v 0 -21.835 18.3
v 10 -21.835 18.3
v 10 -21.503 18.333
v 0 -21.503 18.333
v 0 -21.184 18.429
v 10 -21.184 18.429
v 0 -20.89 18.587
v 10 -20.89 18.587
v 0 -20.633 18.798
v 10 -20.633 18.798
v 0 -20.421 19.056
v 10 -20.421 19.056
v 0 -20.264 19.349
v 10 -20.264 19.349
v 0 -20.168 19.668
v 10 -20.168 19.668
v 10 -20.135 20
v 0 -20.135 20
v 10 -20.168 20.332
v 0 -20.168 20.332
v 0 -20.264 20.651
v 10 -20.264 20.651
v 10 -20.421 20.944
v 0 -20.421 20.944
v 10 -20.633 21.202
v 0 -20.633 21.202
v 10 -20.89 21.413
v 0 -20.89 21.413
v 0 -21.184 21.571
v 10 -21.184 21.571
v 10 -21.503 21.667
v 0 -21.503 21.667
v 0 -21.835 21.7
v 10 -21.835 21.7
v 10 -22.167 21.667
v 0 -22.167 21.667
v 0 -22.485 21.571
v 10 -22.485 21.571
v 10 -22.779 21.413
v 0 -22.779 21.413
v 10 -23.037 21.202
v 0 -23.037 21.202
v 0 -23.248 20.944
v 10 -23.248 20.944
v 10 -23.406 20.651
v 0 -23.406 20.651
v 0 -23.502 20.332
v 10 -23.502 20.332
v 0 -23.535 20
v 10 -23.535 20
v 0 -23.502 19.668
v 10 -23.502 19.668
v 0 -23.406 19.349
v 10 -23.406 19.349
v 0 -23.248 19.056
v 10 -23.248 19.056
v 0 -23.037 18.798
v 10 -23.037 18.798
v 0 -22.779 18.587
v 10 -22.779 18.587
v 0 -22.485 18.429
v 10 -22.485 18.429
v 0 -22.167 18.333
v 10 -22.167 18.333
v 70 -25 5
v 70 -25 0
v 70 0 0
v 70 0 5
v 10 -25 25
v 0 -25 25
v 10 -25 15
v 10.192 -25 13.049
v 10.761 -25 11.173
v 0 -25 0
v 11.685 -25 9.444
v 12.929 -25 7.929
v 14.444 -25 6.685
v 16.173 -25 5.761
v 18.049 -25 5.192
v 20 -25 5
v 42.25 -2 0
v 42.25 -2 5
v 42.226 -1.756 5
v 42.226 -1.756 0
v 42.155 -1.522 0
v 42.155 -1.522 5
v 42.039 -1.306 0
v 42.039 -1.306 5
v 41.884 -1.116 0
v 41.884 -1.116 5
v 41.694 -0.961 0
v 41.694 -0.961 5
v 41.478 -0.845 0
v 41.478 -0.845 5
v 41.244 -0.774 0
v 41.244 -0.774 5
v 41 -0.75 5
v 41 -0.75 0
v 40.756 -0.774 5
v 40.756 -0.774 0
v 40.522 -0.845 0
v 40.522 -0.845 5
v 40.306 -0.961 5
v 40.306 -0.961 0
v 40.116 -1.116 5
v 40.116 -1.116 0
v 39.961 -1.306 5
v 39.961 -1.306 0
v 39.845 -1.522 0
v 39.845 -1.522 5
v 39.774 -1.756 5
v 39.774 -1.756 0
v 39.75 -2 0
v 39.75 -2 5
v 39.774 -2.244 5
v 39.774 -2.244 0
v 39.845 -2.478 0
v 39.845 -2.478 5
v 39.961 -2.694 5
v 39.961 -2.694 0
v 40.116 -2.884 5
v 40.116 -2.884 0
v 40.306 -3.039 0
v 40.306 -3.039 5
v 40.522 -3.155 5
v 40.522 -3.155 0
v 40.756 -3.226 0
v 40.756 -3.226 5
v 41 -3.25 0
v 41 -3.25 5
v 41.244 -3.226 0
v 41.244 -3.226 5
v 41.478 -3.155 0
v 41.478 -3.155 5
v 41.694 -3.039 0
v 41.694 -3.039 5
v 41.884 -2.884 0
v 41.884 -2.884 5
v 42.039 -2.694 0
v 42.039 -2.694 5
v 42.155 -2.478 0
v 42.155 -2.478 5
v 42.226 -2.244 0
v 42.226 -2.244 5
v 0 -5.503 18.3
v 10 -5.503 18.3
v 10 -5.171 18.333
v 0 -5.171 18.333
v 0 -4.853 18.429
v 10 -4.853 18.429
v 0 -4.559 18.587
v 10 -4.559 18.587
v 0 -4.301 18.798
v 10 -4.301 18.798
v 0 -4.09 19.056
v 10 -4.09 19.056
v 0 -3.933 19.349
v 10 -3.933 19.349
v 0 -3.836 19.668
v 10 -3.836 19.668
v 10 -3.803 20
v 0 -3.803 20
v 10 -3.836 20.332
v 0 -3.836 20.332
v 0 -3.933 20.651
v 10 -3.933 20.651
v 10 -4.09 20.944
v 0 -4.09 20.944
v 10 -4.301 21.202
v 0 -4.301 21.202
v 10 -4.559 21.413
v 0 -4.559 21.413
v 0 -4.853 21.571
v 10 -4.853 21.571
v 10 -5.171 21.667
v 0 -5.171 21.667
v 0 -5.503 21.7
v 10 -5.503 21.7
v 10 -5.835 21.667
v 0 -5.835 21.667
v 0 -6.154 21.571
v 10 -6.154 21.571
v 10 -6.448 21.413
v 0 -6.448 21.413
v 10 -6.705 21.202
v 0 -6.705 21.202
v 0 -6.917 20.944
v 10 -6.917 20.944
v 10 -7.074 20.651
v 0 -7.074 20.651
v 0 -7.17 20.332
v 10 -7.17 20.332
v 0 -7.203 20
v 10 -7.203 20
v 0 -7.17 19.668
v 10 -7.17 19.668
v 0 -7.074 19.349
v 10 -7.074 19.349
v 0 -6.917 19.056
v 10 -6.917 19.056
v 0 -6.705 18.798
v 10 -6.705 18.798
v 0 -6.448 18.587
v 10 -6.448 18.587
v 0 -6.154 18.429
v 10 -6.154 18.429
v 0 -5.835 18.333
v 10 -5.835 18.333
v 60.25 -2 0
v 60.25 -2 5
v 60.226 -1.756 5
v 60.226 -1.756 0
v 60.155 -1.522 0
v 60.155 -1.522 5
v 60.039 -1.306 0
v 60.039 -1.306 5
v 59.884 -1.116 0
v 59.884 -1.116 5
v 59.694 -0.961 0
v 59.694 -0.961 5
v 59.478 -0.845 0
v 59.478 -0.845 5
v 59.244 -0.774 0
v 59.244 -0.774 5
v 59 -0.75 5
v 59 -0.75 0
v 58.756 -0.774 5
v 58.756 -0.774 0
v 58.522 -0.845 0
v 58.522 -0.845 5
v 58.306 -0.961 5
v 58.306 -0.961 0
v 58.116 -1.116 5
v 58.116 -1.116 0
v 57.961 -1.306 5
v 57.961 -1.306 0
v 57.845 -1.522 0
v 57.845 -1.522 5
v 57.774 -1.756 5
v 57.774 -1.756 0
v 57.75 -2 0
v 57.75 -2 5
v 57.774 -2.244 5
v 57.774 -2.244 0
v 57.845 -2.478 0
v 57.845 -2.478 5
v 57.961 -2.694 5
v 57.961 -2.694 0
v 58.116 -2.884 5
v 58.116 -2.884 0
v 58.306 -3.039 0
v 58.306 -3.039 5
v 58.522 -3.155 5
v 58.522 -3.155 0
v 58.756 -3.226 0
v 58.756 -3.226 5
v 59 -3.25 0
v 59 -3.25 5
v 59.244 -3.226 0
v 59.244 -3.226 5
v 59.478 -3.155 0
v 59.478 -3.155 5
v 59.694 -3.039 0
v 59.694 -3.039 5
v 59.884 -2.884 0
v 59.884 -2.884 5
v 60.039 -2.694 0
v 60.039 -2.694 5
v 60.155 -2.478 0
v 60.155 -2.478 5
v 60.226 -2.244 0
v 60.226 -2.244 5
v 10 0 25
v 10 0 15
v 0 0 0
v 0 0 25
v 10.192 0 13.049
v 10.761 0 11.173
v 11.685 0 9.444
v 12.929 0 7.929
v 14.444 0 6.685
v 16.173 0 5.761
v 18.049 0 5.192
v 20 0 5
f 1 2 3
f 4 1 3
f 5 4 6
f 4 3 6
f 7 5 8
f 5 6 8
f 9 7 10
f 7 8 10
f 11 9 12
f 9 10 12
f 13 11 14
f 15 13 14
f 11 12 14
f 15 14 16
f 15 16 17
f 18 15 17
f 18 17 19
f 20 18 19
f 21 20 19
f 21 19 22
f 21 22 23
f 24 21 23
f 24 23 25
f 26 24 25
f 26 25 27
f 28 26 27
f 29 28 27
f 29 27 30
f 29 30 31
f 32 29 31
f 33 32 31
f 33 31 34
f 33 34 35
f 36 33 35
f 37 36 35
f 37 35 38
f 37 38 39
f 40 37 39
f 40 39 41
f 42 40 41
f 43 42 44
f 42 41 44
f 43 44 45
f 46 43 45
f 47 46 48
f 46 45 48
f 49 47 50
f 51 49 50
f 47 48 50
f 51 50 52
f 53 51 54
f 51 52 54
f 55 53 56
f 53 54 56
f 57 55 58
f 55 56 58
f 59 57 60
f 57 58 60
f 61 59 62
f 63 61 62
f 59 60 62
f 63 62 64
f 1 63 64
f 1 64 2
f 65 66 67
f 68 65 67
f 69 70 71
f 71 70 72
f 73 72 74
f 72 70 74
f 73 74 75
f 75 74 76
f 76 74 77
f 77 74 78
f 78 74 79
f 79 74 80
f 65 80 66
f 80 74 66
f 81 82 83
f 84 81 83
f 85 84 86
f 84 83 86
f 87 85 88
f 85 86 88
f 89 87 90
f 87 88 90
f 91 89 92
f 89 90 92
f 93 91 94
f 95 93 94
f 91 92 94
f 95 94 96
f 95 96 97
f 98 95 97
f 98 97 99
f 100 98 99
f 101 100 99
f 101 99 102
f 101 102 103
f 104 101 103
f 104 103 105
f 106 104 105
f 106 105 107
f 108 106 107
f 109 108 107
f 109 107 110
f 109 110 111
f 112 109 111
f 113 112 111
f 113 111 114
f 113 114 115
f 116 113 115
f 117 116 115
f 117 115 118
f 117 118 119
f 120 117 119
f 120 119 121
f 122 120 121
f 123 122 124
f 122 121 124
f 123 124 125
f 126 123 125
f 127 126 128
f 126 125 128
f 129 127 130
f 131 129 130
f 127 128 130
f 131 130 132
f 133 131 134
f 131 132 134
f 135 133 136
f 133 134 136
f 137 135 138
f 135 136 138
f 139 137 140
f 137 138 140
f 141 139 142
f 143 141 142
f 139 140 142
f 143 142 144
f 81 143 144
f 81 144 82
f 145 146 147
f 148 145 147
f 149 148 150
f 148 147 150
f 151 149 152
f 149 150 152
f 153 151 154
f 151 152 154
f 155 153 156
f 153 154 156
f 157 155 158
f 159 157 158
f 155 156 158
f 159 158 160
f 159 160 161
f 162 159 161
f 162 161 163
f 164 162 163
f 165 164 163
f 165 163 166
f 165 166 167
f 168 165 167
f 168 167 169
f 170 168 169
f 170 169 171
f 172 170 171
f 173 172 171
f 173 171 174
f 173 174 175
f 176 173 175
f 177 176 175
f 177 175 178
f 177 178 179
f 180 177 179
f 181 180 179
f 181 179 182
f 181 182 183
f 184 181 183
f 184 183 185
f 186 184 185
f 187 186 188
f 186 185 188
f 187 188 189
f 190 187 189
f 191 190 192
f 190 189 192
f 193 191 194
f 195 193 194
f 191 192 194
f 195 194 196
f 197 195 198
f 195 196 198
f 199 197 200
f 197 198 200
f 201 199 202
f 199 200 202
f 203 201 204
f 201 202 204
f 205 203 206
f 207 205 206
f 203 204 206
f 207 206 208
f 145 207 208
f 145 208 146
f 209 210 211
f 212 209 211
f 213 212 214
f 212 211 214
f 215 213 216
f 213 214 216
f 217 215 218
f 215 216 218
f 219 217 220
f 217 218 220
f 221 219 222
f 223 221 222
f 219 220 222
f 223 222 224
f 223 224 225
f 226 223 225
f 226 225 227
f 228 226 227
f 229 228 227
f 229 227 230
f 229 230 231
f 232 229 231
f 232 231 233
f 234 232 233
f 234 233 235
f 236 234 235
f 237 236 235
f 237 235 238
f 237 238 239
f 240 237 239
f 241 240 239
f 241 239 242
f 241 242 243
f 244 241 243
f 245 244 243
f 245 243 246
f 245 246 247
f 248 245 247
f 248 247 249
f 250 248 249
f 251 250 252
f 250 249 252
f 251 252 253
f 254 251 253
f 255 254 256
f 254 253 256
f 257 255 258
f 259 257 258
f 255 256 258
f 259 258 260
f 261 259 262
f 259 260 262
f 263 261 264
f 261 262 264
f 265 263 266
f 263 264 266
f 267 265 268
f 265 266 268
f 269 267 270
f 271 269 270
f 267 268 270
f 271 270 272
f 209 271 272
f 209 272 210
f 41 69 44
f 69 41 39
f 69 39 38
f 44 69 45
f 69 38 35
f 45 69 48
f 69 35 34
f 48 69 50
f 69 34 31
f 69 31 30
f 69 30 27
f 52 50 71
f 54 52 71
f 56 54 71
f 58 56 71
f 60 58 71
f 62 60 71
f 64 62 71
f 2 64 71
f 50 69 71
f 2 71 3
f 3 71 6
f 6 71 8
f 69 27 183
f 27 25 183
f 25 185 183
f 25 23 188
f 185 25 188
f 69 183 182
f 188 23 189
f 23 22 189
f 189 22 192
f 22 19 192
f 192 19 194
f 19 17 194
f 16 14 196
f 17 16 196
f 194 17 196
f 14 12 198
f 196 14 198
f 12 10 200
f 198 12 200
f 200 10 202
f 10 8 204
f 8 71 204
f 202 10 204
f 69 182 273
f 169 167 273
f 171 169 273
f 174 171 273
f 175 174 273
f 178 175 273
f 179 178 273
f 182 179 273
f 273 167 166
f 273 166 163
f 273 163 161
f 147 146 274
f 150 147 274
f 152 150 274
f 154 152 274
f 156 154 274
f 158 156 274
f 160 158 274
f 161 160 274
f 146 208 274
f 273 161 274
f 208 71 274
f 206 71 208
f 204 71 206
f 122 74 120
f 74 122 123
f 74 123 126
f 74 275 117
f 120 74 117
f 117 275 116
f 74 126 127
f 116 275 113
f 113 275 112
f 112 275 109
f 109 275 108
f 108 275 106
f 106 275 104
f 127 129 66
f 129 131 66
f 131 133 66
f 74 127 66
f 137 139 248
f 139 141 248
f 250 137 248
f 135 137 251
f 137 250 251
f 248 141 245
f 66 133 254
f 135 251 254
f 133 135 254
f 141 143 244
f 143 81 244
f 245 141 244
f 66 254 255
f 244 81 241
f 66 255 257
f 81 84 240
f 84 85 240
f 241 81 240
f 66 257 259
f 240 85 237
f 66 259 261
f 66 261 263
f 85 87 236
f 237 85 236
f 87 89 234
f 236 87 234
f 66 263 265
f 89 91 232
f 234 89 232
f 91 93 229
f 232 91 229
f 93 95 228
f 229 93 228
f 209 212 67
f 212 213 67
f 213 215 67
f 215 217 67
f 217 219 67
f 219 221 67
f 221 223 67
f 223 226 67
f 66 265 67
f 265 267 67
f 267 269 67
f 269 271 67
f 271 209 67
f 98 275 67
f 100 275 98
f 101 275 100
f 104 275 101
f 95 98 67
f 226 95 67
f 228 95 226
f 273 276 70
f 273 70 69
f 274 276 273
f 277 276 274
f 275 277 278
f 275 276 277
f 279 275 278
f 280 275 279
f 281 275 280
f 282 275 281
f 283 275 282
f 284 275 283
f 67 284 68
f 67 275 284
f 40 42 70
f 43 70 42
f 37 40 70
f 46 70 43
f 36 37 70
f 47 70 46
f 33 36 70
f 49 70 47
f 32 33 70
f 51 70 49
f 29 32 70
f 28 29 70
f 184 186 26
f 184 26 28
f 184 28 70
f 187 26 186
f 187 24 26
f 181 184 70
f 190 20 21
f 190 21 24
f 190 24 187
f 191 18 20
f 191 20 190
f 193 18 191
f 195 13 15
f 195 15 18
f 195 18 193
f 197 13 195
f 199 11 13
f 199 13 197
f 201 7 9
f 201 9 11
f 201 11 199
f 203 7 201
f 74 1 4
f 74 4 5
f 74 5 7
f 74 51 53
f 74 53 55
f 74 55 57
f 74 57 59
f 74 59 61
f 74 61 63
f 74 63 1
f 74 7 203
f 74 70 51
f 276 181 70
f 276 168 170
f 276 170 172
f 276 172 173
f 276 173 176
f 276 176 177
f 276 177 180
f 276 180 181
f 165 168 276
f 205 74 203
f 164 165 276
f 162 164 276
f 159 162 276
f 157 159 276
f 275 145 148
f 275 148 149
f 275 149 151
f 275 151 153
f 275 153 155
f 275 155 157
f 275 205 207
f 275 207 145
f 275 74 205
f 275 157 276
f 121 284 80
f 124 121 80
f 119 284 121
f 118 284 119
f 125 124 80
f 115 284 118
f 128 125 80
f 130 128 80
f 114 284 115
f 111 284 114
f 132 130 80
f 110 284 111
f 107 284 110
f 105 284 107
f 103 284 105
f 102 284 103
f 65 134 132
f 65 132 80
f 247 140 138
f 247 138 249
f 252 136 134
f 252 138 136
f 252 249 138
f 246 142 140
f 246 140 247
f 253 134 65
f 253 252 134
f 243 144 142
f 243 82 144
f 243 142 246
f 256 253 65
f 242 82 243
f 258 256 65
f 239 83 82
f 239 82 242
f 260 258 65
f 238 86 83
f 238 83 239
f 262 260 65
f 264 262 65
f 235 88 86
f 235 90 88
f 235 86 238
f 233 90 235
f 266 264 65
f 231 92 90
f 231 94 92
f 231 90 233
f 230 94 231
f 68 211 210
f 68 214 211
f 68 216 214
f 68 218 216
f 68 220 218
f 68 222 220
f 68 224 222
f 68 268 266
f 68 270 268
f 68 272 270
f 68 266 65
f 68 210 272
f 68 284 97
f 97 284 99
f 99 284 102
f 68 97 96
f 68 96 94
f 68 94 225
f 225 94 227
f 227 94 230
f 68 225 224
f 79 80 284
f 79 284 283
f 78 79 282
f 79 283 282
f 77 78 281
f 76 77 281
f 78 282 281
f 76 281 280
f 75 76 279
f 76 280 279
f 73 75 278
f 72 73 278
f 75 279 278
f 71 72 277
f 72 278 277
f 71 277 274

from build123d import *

# Parameters (mm, degrees)
SKETCH1_W           = 70
SKETCH1_H           = 25
BOSS_EXTRUDE1_DEPTH = 5
SKETCH2_R           = 1.25
CUT_EXTRUDE2_DEPTH  = 6
SKETCH5_W           = 10
SKETCH5_H           = 25
BOSS_EXTRUDE3_DEPTH = 20
FILLET1_R           = 10
SKETCH6_R           = 1.7
CUT_EXTRUDE3_DEPTH  = 11


with BuildPart() as part:
    # Sketch1 → Boss-Extrude1 (new body)
    with BuildSketch(Plane.XY):
        with Locations((35, -12.5)):
            Rectangle(SKETCH1_W, SKETCH1_H)
    extrude(amount=BOSS_EXTRUDE1_DEPTH)

    # Sketch2 → Cut-Extrude2 (cut, through all)
    with BuildSketch(Plane.XY.offset(5)):
        with Locations((41, -2)):
            Circle(SKETCH2_R)
        with Locations((59, -2)):
            Circle(SKETCH2_R)
    extrude(amount=-CUT_EXTRUDE2_DEPTH, mode=Mode.SUBTRACT)

    # Sketch5 → Boss-Extrude3 (add)
    with BuildSketch(Plane.XY.offset(5)):
        with Locations((5, -12.5)):
            Rectangle(SKETCH5_W, SKETCH5_H)
    extrude(amount=BOSS_EXTRUDE3_DEPTH)

    # Fillet1
    fillet1_edges = [part.edges().sort_by_distance(p)[0] for p in [
        (10, -12.5, 5),
    ]]
    fillet(fillet1_edges, radius=FILLET1_R)

    # Sketch6 → Cut-Extrude3 (cut, through all)
    with BuildSketch(Plane(origin=(10, 0, 0), x_dir=(0, 0, -1), z_dir=(1, 0, 0))):
        with Locations((-20, -21.834919238)):
            Circle(SKETCH6_R)
        with Locations((-20, -5.503108416)):
            Circle(SKETCH6_R)
    extrude(amount=-CUT_EXTRUDE3_DEPTH, mode=Mode.SUBTRACT)


solid = part.part
